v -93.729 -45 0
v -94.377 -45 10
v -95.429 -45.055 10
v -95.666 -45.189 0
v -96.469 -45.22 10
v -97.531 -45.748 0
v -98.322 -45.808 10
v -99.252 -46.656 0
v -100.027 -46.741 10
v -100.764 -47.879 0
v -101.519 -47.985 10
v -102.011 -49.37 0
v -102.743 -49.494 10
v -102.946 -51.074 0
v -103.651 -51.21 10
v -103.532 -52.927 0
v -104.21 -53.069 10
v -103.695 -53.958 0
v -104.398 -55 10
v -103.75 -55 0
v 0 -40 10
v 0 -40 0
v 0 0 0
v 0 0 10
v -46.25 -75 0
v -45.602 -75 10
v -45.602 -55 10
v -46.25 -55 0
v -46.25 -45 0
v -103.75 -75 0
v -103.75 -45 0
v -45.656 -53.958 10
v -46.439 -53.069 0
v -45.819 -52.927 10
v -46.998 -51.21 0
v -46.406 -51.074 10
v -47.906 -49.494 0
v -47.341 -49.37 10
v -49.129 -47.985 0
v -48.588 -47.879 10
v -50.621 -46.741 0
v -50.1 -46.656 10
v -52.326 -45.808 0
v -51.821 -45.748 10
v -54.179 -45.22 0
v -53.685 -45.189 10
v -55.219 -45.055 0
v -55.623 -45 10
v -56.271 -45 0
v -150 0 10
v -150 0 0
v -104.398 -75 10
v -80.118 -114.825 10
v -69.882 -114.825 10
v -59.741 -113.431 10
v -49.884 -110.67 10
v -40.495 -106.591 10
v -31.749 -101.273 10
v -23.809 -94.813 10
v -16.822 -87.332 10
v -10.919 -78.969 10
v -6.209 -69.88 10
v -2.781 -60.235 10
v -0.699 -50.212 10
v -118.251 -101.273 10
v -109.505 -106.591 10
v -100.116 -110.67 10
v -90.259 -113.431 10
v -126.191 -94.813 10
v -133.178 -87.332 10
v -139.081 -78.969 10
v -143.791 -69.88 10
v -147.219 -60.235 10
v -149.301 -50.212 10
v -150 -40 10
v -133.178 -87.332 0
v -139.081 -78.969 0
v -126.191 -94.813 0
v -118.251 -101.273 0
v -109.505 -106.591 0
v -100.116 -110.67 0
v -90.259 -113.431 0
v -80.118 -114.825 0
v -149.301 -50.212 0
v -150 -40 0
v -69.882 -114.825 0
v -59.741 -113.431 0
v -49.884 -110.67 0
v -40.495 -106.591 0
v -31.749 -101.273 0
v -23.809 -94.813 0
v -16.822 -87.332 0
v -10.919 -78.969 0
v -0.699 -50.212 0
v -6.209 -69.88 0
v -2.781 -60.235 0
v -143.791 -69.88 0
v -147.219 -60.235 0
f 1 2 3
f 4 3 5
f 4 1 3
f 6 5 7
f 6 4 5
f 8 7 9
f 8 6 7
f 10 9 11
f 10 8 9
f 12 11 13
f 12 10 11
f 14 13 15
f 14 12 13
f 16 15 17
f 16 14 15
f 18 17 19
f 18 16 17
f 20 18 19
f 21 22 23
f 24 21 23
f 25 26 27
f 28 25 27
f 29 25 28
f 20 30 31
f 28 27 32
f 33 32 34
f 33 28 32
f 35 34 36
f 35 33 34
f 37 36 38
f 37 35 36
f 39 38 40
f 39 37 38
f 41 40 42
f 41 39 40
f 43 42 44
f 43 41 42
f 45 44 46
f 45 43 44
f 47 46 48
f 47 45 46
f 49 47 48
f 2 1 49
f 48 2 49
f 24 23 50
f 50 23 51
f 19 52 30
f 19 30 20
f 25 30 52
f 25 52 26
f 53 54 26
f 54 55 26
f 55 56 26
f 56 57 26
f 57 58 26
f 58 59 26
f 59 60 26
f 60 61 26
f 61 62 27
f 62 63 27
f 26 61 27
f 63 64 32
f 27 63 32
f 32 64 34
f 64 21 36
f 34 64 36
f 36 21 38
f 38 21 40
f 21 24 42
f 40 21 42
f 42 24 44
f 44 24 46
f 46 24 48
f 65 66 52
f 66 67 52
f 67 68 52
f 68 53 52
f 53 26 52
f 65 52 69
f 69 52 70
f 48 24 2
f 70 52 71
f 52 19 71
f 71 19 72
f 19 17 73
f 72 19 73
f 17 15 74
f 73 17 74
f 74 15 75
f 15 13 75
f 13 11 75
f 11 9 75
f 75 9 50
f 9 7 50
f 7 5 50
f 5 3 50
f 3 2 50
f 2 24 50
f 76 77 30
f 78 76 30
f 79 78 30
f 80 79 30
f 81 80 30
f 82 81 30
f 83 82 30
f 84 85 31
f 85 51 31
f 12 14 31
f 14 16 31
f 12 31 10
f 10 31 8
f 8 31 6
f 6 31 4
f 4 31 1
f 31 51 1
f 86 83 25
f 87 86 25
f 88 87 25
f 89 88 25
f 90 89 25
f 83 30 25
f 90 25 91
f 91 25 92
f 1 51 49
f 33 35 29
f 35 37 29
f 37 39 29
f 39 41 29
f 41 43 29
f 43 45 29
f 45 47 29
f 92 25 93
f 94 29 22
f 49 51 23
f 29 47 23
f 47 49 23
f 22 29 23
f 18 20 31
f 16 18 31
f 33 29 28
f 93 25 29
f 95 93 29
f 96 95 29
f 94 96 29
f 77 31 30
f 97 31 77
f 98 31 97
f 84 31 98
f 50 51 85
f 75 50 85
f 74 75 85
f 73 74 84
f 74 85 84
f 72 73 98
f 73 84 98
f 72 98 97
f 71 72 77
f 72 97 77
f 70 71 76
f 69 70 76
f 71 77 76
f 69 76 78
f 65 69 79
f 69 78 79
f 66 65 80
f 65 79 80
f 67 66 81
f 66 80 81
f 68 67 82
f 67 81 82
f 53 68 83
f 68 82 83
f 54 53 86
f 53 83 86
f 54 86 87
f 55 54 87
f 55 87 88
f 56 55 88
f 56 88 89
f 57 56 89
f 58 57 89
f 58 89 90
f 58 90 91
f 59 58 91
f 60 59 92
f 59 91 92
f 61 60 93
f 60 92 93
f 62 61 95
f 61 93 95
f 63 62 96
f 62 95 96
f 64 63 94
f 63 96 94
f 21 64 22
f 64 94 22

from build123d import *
from OCP.BRepFilletAPI import BRepFilletAPI_MakeChamfer

# Parameters (mm, degrees)
SKETCH1_W           = 57.5
SKETCH1_H           = 30
BOSS_EXTRUDE1_DEPTH = 10
CHAMFER1_SIZE       = 10
CHAMFER1_SIZE_2     = 0.648423639
FILLET1_R           = 10


# Some blends are built 0.0001 mm under size
with BuildPart() as part:
    # Sketch1 → Boss-Extrude1 (new body)
    with BuildSketch(Plane.XY):
        with BuildLine():
            Line((0, -40), (0, 0))
            Line((0, 0), (-150, 0))
            Line((-150, 0), (-150, -40))
            ThreePointArc((-150, -40), (-75, -115), (0, -40))
        make_face()
        with Locations((-75, -60)):
            Rectangle(SKETCH1_W, SKETCH1_H, mode=Mode.SUBTRACT)
    extrude(amount=BOSS_EXTRUDE1_DEPTH)

    # Chamfer1
    chamfer1_edges_1 = [part.edges().sort_by_distance(p)[0] for p in [
        (-46.25, -60, 10),
    ]]
    chamfer1_side_1 = [part.faces().sort_by_distance(p)[0] for p in [
        (-46.25, -60, 9.987031527),
    ]]
    chamfer1_edges_2 = [part.edges().sort_by_distance(p)[0] for p in [
        (-103.75, -60, 10),
    ]]
    chamfer1_side_2 = [part.faces().sort_by_distance(p)[0] for p in [
        (-103.75, -60, 9.987031527),
    ]]
    chamfer1 = BRepFilletAPI_MakeChamfer(part.part.solid().wrapped)
    for e in chamfer1_edges_1:
        chamfer1.Add(CHAMFER1_SIZE - 0.0001, CHAMFER1_SIZE_2 - 0.0001, e.wrapped, chamfer1_side_1[0].wrapped)
    for e in chamfer1_edges_2:
        chamfer1.Add(CHAMFER1_SIZE - 0.0001, CHAMFER1_SIZE_2 - 0.0001, e.wrapped, chamfer1_side_2[0].wrapped)
    add(Compound.cast(chamfer1.Shape()), mode=Mode.REPLACE)  # a hair under: the kernel refuses the full size

    # Fillet1
    # the kernel refuses this fillet: 10 mm, written as the material it adds along each edge
    with BuildSketch(Plane(origin=(-47.867429584, -45, -24.947523565), x_dir=(-0.9979049426006561, 0, 0.06469718334812755), z_dir=(0.06469718334812756, 0, 0.9979049426006562))) as fillet1_piece_1_section:
        with BuildLine():
            CenterArc((FILLET1_R, FILLET1_R), FILLET1_R, 180, 90)
            Line((0, FILLET1_R), (0, 0))
            Line((0, 0), (FILLET1_R, 0))
        make_face()
    fillet1_piece_1 = extrude(amount=60.020894349, mode=Mode.PRIVATE)
    fillet1_piece_1 = split(fillet1_piece_1, bisect_by=Plane(origin=(-48.707082499, -46.782935943, 10), z_dir=(0, 0, -1)), keep=Keep.TOP, mode=Mode.PRIVATE)
    fillet1_piece_1 = split(fillet1_piece_1, bisect_by=Plane(origin=(-48.707082499, -46.782935943, 0), z_dir=(0, 0, 1)), keep=Keep.TOP, mode=Mode.PRIVATE)
    add(fillet1_piece_1)
    with BuildSketch(Plane(origin=(-102.132570416, -45, -24.947523565), x_dir=(0.9979049426006561, 0, 0.06469718334812756), z_dir=(-0.06469718334812756, 0, 0.9979049426006562))) as fillet1_piece_2_section:
        with BuildLine():
            CenterArc((FILLET1_R, -FILLET1_R), FILLET1_R, 90, 90)
            Line((0, -FILLET1_R), (0, 0))
            Line((0, 0), (FILLET1_R, 0))
        make_face()
    fillet1_piece_2 = extrude(amount=60.020894349, mode=Mode.PRIVATE)
    fillet1_piece_2 = split(fillet1_piece_2, bisect_by=Plane(origin=(-101.292917501, -46.782935943, 10), z_dir=(0, 0, -1)), keep=Keep.TOP, mode=Mode.PRIVATE)
    fillet1_piece_2 = split(fillet1_piece_2, bisect_by=Plane(origin=(-101.292917501, -46.782935943, 0), z_dir=(0, 0, 1)), keep=Keep.TOP, mode=Mode.PRIVATE)
    add(fillet1_piece_2)


solid = part.part
